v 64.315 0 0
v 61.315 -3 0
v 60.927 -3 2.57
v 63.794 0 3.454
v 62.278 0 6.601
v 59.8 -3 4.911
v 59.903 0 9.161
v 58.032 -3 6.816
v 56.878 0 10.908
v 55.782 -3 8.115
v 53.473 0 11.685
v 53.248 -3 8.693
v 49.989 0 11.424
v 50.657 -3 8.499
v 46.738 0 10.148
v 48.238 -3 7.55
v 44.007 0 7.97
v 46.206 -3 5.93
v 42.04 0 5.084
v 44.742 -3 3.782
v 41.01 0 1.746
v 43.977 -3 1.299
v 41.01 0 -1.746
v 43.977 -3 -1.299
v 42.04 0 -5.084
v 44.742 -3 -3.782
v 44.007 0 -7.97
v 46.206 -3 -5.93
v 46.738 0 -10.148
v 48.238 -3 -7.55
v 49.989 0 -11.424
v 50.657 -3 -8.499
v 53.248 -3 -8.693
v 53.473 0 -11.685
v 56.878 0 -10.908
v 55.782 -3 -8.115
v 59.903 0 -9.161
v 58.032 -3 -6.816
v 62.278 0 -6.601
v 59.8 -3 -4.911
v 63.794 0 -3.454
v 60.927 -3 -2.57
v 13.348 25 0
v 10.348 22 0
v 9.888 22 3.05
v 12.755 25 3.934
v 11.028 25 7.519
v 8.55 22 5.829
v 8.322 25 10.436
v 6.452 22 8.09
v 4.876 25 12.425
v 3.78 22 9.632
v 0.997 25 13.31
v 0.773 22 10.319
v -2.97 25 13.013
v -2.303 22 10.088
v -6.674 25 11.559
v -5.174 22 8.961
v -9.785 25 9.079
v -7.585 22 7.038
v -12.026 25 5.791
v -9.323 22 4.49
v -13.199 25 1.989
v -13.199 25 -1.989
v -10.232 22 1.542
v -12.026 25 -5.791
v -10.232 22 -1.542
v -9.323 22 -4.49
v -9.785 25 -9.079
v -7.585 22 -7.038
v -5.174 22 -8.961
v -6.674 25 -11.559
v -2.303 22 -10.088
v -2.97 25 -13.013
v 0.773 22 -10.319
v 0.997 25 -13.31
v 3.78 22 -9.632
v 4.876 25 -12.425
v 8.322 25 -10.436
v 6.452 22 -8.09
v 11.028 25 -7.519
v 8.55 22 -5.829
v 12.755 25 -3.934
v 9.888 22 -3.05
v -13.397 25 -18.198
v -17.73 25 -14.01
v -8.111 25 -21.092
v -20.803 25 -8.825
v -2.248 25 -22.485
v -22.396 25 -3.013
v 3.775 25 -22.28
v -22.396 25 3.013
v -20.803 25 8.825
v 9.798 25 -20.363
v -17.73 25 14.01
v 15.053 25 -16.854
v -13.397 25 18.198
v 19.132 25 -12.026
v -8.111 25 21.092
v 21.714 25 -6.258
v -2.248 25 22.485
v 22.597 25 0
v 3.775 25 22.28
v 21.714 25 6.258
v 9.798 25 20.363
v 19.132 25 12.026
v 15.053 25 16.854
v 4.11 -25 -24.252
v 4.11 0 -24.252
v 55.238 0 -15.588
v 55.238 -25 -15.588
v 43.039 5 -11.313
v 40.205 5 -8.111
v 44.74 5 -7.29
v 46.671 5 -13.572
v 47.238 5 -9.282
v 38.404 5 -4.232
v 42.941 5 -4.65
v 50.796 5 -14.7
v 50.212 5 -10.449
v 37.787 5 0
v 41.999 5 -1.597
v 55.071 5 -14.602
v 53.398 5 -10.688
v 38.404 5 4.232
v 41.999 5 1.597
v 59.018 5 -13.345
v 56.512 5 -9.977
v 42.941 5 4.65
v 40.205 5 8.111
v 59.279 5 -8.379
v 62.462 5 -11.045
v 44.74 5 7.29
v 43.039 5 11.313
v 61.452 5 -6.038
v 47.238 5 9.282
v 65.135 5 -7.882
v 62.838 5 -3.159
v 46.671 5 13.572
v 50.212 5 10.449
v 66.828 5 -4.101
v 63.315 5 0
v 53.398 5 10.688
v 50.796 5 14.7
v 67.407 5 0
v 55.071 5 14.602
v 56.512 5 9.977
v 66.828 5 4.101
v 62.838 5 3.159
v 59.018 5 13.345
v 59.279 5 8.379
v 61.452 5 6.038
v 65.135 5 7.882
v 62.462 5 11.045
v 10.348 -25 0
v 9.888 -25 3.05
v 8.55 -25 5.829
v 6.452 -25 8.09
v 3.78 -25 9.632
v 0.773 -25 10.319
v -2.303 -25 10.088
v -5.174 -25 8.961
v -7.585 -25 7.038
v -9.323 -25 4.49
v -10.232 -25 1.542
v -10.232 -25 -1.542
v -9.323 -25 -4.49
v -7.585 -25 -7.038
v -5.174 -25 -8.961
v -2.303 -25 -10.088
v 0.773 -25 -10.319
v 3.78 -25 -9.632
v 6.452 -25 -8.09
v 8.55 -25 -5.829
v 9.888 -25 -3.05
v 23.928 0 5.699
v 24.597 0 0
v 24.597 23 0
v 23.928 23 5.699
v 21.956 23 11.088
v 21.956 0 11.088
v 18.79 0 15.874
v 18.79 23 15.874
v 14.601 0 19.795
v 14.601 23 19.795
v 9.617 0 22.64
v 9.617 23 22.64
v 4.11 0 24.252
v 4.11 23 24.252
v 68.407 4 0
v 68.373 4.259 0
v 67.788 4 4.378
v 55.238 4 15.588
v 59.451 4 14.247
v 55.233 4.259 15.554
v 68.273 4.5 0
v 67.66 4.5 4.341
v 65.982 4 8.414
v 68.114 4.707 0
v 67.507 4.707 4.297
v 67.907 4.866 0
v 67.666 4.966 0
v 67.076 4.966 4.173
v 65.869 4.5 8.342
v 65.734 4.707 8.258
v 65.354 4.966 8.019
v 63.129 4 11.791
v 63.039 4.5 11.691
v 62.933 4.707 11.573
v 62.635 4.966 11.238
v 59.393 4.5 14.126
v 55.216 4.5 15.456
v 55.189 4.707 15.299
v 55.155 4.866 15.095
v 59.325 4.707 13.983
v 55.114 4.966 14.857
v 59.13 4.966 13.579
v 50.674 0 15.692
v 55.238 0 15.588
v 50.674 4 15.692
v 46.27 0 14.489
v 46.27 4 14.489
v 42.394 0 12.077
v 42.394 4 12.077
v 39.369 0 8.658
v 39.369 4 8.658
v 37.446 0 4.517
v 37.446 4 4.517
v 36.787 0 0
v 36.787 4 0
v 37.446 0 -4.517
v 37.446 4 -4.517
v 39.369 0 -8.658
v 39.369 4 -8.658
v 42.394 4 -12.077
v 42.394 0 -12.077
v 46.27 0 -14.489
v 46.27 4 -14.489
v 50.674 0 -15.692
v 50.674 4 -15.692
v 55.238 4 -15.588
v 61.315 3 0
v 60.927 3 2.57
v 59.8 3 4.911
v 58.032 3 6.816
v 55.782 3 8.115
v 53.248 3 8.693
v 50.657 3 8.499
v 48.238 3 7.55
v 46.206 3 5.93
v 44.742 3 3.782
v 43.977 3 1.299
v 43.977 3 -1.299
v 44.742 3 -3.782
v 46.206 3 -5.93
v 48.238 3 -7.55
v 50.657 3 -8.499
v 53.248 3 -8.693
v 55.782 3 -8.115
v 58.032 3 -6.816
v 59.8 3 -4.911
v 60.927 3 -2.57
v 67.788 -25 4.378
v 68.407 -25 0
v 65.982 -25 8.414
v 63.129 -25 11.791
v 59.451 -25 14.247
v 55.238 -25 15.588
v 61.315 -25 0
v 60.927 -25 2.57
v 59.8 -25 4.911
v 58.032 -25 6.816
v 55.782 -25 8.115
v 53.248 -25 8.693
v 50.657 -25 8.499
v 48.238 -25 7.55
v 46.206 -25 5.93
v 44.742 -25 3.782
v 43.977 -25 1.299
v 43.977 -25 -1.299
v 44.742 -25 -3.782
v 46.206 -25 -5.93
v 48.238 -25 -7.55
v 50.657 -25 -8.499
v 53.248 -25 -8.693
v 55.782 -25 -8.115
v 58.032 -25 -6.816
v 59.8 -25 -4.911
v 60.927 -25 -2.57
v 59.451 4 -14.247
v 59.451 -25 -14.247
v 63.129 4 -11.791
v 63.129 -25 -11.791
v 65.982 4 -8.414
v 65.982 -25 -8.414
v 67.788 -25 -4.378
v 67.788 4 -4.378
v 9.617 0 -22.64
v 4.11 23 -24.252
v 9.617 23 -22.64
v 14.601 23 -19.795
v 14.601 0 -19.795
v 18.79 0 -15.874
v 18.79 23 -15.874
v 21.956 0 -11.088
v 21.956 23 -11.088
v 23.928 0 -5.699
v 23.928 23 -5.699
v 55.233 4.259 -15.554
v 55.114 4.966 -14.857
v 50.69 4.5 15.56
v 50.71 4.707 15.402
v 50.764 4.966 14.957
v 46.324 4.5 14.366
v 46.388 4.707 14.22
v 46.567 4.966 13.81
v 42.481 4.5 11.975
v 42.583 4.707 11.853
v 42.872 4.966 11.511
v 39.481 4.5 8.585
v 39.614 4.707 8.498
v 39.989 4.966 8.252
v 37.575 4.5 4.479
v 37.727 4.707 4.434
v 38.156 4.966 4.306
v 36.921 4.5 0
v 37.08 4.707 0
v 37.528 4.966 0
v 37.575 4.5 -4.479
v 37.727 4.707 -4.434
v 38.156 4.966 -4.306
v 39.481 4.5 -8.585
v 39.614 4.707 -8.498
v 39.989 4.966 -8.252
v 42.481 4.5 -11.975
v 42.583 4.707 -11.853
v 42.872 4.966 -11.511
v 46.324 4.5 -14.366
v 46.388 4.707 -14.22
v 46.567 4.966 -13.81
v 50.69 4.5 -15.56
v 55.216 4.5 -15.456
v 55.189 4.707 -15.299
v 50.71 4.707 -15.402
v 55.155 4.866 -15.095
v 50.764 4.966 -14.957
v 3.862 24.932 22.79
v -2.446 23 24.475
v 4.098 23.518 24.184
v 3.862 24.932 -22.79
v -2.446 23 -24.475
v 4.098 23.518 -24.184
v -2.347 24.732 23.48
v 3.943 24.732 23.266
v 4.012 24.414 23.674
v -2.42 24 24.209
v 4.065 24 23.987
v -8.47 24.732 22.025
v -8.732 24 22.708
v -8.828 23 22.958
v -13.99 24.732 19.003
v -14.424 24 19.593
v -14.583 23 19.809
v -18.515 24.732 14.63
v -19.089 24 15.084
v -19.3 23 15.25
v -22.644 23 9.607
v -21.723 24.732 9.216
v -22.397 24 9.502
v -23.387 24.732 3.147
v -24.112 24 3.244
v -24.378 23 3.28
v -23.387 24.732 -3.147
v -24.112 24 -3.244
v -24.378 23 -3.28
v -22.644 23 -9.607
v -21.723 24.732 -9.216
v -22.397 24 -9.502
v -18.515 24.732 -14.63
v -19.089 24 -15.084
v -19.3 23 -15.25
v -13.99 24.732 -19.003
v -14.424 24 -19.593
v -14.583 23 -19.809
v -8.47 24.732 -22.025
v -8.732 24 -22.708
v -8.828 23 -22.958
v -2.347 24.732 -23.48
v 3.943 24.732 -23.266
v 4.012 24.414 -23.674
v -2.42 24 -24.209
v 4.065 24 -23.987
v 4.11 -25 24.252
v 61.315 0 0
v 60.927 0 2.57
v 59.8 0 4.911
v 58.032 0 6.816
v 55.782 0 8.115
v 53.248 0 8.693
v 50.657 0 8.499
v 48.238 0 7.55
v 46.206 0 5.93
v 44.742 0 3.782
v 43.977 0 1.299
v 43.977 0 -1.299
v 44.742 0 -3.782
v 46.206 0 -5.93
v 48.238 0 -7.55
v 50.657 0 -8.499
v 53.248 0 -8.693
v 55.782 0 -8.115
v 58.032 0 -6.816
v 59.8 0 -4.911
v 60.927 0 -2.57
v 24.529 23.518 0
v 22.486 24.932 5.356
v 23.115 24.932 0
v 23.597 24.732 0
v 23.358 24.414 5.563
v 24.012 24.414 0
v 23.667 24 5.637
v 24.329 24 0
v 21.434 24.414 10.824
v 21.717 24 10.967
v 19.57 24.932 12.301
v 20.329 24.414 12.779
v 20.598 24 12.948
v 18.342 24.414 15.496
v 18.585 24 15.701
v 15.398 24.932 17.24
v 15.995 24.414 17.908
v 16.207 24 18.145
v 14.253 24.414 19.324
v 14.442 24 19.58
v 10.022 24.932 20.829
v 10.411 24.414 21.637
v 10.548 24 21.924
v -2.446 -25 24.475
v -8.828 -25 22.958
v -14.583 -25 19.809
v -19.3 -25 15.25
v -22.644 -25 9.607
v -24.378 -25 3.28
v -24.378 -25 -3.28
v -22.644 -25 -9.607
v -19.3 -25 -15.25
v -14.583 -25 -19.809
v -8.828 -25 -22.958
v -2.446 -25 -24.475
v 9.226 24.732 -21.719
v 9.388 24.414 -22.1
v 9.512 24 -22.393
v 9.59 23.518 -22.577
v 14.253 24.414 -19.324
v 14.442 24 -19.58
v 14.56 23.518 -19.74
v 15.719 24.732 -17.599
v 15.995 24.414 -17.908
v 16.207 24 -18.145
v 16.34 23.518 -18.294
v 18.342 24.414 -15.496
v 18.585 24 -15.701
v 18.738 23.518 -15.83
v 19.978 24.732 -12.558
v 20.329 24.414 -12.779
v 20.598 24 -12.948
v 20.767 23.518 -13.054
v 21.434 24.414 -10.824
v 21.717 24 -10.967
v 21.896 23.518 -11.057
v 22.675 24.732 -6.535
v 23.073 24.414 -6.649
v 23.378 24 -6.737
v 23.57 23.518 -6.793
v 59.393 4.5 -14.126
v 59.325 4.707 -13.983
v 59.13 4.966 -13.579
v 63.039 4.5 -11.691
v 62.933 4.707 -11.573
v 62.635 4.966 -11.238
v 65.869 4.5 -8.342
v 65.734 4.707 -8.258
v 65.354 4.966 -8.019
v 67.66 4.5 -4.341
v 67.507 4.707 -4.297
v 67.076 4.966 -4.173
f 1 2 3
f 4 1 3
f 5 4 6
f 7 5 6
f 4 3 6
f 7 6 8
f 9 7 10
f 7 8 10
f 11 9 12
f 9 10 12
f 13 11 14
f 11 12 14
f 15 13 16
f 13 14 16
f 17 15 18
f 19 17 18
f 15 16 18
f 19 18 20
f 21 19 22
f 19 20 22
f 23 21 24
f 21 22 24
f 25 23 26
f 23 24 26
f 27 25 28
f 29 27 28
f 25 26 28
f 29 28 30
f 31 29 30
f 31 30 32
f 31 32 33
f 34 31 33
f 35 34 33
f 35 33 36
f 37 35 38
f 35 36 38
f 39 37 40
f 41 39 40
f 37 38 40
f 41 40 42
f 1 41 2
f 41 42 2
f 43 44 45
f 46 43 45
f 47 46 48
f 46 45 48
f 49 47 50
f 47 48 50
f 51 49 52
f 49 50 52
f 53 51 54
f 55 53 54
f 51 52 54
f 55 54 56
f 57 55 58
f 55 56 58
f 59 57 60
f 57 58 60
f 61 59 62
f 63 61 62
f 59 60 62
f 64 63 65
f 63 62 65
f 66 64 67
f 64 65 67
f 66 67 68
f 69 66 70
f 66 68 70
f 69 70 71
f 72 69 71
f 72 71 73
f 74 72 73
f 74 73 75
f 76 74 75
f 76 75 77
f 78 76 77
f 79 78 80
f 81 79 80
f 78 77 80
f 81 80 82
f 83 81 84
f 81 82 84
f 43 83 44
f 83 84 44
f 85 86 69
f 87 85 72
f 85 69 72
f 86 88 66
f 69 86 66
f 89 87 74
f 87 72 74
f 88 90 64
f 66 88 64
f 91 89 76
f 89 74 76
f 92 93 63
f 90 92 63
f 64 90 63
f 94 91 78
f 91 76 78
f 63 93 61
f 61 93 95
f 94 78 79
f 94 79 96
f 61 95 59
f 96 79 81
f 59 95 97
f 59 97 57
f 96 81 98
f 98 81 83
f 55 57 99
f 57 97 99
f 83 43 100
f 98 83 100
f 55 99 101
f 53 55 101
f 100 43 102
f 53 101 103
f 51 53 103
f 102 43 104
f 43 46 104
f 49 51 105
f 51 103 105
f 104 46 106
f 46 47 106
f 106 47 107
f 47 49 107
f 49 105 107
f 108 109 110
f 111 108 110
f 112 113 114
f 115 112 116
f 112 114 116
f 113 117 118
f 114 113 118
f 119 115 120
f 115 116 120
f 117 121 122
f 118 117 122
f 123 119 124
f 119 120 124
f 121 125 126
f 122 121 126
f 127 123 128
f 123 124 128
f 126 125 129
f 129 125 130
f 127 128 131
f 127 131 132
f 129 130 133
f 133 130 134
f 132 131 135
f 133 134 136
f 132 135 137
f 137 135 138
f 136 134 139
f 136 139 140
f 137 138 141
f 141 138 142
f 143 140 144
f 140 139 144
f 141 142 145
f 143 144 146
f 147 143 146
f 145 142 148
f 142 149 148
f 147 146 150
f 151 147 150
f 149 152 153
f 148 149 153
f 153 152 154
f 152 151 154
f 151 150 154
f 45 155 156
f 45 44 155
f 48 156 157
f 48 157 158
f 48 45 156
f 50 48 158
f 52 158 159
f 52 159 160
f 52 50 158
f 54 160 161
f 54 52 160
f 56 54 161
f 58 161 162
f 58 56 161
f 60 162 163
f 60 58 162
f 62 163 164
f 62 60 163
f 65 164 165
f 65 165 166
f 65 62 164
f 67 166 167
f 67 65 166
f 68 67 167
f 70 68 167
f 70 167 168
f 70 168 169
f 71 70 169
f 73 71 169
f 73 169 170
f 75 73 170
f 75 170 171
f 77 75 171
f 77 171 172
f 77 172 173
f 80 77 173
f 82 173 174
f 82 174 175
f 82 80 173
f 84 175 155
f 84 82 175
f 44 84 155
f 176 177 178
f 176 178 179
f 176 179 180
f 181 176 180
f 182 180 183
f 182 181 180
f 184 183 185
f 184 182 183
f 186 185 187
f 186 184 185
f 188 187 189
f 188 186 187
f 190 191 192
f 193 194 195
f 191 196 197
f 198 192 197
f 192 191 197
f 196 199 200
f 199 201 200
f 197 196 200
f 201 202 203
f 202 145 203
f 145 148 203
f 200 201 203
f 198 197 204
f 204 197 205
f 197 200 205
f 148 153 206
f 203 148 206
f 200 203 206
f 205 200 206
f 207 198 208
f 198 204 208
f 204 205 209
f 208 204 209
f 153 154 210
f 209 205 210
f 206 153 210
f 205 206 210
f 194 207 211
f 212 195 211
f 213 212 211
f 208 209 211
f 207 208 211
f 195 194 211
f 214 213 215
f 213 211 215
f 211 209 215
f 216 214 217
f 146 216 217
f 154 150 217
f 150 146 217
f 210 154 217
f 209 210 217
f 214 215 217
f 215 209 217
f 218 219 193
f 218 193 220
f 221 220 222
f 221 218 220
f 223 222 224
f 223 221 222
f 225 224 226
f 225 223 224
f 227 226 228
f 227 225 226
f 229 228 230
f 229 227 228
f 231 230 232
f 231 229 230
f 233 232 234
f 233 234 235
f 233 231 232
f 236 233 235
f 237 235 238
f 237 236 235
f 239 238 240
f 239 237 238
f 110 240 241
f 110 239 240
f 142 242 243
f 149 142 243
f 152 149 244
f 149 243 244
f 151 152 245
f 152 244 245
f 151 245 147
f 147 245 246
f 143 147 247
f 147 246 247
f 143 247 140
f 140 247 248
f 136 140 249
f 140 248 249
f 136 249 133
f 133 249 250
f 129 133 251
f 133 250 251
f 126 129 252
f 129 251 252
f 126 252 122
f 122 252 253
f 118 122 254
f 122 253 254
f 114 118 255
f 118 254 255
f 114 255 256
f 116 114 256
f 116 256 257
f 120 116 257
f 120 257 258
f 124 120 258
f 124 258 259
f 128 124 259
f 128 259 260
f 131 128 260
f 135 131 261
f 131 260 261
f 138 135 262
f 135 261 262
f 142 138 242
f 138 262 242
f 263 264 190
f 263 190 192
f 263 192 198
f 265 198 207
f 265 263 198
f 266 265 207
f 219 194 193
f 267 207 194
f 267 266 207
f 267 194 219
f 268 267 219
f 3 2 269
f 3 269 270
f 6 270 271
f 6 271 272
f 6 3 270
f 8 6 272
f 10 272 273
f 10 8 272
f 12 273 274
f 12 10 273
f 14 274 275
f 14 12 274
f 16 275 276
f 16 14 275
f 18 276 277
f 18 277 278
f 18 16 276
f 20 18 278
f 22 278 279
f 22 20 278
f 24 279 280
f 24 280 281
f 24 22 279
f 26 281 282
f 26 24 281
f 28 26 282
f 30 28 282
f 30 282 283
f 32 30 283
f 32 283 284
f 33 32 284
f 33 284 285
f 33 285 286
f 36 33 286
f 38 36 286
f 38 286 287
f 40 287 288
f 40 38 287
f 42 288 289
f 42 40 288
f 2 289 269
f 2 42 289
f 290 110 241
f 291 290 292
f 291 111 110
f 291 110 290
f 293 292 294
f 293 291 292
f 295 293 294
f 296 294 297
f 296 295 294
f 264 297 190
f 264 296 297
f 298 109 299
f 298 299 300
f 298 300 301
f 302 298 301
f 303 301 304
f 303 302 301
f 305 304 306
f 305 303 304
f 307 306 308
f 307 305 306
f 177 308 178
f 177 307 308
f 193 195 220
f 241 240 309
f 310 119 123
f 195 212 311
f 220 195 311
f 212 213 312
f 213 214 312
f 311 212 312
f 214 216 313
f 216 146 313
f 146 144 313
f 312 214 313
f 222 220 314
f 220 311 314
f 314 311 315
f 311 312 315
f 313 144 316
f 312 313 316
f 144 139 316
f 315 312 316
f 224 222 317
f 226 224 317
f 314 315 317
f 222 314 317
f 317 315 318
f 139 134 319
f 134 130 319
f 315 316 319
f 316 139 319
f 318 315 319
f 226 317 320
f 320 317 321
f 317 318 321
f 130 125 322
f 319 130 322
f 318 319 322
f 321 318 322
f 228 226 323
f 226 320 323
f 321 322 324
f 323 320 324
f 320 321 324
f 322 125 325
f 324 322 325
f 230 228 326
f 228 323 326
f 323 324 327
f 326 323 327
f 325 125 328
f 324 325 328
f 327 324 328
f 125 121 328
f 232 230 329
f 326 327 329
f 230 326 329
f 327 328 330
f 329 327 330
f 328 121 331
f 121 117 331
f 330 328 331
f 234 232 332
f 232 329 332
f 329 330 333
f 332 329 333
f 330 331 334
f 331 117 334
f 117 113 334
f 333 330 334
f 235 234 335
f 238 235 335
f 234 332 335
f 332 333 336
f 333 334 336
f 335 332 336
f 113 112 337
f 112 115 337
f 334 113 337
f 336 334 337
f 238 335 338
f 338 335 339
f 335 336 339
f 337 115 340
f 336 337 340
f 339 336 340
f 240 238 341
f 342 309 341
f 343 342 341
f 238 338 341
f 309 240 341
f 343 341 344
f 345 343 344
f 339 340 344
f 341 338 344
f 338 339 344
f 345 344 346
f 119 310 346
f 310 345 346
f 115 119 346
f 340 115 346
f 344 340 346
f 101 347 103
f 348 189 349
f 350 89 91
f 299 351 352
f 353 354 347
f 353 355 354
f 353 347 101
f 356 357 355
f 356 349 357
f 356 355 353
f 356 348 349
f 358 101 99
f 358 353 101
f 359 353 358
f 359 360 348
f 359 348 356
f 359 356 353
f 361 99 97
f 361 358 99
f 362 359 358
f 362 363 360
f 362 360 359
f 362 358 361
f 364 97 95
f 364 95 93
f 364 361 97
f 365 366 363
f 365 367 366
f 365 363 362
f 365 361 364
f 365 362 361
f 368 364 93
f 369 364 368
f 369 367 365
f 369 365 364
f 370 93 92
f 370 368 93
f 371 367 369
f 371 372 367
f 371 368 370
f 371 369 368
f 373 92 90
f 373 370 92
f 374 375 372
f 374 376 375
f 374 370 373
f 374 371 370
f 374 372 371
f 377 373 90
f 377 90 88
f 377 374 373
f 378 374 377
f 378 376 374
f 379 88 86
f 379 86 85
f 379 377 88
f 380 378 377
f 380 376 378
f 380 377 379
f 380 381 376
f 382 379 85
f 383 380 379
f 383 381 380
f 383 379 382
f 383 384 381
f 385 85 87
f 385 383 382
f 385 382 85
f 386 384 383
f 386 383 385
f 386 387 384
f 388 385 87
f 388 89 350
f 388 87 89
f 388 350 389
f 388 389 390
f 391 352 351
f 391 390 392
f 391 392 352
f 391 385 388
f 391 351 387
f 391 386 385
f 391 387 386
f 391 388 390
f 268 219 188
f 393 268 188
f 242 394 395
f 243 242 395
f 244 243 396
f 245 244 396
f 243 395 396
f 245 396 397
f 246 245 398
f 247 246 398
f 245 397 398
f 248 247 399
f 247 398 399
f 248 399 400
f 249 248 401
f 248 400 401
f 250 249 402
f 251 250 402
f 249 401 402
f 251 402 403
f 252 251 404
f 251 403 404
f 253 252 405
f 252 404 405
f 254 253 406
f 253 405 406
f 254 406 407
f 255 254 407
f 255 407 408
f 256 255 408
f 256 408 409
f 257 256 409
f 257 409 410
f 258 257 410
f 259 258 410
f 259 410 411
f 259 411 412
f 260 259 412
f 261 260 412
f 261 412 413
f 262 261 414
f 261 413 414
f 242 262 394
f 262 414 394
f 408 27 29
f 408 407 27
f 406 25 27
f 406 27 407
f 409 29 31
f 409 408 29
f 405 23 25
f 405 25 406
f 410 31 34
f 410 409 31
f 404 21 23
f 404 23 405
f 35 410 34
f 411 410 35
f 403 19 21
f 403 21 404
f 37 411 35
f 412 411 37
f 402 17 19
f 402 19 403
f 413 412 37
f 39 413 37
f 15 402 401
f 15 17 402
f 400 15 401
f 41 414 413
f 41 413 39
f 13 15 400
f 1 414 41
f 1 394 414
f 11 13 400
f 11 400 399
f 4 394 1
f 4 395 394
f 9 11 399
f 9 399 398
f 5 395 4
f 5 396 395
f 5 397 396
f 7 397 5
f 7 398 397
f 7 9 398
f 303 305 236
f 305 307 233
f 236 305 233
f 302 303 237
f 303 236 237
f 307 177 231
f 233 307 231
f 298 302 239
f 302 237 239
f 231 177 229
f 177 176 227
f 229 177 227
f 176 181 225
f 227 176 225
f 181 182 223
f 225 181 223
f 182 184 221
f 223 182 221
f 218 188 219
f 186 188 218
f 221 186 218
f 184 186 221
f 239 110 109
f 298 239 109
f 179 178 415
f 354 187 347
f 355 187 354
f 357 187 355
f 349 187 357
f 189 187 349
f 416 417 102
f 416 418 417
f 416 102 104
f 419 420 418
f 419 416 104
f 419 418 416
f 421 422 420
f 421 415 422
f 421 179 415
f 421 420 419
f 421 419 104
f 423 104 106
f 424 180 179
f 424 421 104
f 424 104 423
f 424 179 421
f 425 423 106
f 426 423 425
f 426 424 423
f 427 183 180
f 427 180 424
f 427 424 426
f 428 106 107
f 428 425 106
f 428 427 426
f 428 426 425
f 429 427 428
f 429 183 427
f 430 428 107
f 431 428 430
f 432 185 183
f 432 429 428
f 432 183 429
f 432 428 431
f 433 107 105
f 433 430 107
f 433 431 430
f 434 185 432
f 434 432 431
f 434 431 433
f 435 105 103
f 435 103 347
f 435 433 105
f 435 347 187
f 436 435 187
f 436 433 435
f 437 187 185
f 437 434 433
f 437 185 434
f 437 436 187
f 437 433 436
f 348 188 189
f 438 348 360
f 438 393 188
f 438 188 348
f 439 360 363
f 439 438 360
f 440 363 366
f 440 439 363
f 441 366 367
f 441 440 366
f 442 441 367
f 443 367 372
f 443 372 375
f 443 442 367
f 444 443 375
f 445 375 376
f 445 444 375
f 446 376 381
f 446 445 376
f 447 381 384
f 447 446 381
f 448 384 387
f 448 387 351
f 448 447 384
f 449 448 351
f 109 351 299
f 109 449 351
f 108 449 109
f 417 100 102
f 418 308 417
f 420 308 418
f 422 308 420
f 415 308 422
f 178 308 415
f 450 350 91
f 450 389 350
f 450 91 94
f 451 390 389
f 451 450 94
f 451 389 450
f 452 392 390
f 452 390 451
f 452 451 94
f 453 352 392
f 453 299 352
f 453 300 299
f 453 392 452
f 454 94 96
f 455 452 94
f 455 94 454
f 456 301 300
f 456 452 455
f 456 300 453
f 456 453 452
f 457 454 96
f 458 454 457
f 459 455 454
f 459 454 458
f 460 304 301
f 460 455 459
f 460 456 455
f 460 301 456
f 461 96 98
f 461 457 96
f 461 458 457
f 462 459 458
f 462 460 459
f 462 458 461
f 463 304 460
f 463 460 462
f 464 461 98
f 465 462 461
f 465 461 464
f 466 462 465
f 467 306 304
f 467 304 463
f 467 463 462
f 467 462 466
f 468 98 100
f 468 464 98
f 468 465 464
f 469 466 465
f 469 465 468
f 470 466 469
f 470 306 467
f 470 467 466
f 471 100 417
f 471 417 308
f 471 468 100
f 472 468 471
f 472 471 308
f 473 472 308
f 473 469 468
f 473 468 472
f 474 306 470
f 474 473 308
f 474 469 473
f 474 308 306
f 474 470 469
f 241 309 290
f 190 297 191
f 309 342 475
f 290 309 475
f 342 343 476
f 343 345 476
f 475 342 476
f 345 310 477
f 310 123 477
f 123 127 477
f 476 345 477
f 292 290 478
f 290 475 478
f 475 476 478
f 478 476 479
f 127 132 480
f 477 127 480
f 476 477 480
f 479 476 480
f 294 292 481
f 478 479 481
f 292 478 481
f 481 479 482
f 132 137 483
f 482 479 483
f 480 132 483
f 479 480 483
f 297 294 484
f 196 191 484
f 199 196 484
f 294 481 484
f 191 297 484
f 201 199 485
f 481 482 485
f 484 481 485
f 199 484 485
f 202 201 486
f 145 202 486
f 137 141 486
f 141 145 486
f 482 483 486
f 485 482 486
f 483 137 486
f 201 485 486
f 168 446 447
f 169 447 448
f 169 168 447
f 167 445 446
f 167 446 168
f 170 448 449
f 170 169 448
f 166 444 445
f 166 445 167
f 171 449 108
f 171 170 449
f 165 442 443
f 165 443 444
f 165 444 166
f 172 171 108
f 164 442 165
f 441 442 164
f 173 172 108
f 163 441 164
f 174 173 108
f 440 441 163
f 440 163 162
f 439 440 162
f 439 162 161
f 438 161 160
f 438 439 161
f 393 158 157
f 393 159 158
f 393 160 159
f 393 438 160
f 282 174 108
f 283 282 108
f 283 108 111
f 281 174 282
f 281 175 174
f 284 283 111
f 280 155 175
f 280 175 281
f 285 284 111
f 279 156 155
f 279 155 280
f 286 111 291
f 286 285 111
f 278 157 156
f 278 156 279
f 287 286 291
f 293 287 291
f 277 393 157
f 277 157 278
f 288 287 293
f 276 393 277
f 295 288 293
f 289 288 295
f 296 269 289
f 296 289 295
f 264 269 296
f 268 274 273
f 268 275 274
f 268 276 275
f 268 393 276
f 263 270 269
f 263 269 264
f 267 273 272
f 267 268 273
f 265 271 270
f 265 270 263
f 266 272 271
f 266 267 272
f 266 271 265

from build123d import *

# Parameters (mm, degrees)
F0_R     = 10.347631
F0_R_2   = 8.717715
F1_DEPTH = 25
F2_DEPTH = 25
F3_SIZE  = 3
F4_R     = 2
F5_DEPTH = 5
F6_R     = 1
F7_SIZE  = 2


with BuildPart() as f1:
    # F0 (on Front) → F1 (new body)
    with BuildSketch(Plane.XZ):
        with BuildLine():
            ThreePointArc((4.109595, -24.251677), (18.789865, -15.873677), (24.597411, 0))
            ThreePointArc((24.597411, 0), (18.789865, 15.873677), (4.109595, 24.251677))
            ThreePointArc((4.109595, 24.251677), (-24.597411, 0), (4.109595, -24.251677))
        make_face()
        Circle(F0_R, mode=Mode.SUBTRACT)
        with BuildLine():
            ThreePointArc((4.109595, 24.251677), (18.789865, 15.873677), (24.597411, 0))
            ThreePointArc((24.597411, 0), (18.789865, -15.873677), (4.109595, -24.251677))
            Line((4.109595, -24.251677), (55.238279, -15.58761))
            ThreePointArc((55.238279, -15.58761), (36.787036, 0), (55.238279, 15.58761))
            Line((55.238279, 15.58761), (4.109595, 24.251677))
        make_face()
        with BuildLine():
            ThreePointArc((68.406691, 0), (64.673928, 10.202704), (55.238279, 15.58761))
            ThreePointArc((55.238279, 15.58761), (36.787036, 0), (55.238279, -15.58761))
            ThreePointArc((55.238279, -15.58761), (64.673928, -10.202704), (68.406691, 0))
        make_face()
        with Locations((52.596863, 0)):
            Circle(F0_R_2, mode=Mode.SUBTRACT)
    extrude(amount=F1_DEPTH)

    # F0 (on Front) → F2 (join)
    with BuildSketch(Plane.XZ):
        with BuildLine():
            ThreePointArc((4.109595, -24.251677), (18.789865, -15.873677), (24.597411, 0))
            ThreePointArc((24.597411, 0), (18.789865, 15.873677), (4.109595, 24.251677))
            ThreePointArc((4.109595, 24.251677), (-24.597411, 0), (4.109595, -24.251677))
        make_face()
        Circle(F0_R, mode=Mode.SUBTRACT)
    extrude(amount=-F2_DEPTH)

    # F3
    f3_edges = [f1.edges().sort_by_distance(p)[0] for p in [
        (-10.347631, 25, 0),
        (43.879148, 0, 0),
    ]]
    chamfer(f3_edges, length=F3_SIZE)

    # F4
    f4_edges = [f1.edges().sort_by_distance(p)[0] for p in [
        (-4.109595, 25, 24.251677),
    ]]
    fillet(f4_edges, radius=F4_R)

    # F0 (on Front) → F5 (join)
    with BuildSketch(Plane.XZ):
        with BuildLine():
            ThreePointArc((68.406691, 0), (64.673928, 10.202704), (55.238279, 15.58761))
            ThreePointArc((55.238279, 15.58761), (36.787036, 0), (55.238279, -15.58761))
            ThreePointArc((55.238279, -15.58761), (64.673928, -10.202704), (68.406691, 0))
        make_face()
        with Locations((52.596863, 0)):
            Circle(F0_R_2, mode=Mode.SUBTRACT)
    extrude(amount=-F5_DEPTH)

    # F6
    f6_edges = [f1.edges().sort_by_distance(p)[0] for p in [
        (49.955448, 5, 15.58761),
    ]]
    fillet(f6_edges, radius=F6_R)

    # F7
    f7_edges = [f1.edges().sort_by_distance(p)[0] for p in [
        (43.879148, 5, 0),
    ]]
    chamfer(f7_edges, length=F7_SIZE)


solid = f1.part
